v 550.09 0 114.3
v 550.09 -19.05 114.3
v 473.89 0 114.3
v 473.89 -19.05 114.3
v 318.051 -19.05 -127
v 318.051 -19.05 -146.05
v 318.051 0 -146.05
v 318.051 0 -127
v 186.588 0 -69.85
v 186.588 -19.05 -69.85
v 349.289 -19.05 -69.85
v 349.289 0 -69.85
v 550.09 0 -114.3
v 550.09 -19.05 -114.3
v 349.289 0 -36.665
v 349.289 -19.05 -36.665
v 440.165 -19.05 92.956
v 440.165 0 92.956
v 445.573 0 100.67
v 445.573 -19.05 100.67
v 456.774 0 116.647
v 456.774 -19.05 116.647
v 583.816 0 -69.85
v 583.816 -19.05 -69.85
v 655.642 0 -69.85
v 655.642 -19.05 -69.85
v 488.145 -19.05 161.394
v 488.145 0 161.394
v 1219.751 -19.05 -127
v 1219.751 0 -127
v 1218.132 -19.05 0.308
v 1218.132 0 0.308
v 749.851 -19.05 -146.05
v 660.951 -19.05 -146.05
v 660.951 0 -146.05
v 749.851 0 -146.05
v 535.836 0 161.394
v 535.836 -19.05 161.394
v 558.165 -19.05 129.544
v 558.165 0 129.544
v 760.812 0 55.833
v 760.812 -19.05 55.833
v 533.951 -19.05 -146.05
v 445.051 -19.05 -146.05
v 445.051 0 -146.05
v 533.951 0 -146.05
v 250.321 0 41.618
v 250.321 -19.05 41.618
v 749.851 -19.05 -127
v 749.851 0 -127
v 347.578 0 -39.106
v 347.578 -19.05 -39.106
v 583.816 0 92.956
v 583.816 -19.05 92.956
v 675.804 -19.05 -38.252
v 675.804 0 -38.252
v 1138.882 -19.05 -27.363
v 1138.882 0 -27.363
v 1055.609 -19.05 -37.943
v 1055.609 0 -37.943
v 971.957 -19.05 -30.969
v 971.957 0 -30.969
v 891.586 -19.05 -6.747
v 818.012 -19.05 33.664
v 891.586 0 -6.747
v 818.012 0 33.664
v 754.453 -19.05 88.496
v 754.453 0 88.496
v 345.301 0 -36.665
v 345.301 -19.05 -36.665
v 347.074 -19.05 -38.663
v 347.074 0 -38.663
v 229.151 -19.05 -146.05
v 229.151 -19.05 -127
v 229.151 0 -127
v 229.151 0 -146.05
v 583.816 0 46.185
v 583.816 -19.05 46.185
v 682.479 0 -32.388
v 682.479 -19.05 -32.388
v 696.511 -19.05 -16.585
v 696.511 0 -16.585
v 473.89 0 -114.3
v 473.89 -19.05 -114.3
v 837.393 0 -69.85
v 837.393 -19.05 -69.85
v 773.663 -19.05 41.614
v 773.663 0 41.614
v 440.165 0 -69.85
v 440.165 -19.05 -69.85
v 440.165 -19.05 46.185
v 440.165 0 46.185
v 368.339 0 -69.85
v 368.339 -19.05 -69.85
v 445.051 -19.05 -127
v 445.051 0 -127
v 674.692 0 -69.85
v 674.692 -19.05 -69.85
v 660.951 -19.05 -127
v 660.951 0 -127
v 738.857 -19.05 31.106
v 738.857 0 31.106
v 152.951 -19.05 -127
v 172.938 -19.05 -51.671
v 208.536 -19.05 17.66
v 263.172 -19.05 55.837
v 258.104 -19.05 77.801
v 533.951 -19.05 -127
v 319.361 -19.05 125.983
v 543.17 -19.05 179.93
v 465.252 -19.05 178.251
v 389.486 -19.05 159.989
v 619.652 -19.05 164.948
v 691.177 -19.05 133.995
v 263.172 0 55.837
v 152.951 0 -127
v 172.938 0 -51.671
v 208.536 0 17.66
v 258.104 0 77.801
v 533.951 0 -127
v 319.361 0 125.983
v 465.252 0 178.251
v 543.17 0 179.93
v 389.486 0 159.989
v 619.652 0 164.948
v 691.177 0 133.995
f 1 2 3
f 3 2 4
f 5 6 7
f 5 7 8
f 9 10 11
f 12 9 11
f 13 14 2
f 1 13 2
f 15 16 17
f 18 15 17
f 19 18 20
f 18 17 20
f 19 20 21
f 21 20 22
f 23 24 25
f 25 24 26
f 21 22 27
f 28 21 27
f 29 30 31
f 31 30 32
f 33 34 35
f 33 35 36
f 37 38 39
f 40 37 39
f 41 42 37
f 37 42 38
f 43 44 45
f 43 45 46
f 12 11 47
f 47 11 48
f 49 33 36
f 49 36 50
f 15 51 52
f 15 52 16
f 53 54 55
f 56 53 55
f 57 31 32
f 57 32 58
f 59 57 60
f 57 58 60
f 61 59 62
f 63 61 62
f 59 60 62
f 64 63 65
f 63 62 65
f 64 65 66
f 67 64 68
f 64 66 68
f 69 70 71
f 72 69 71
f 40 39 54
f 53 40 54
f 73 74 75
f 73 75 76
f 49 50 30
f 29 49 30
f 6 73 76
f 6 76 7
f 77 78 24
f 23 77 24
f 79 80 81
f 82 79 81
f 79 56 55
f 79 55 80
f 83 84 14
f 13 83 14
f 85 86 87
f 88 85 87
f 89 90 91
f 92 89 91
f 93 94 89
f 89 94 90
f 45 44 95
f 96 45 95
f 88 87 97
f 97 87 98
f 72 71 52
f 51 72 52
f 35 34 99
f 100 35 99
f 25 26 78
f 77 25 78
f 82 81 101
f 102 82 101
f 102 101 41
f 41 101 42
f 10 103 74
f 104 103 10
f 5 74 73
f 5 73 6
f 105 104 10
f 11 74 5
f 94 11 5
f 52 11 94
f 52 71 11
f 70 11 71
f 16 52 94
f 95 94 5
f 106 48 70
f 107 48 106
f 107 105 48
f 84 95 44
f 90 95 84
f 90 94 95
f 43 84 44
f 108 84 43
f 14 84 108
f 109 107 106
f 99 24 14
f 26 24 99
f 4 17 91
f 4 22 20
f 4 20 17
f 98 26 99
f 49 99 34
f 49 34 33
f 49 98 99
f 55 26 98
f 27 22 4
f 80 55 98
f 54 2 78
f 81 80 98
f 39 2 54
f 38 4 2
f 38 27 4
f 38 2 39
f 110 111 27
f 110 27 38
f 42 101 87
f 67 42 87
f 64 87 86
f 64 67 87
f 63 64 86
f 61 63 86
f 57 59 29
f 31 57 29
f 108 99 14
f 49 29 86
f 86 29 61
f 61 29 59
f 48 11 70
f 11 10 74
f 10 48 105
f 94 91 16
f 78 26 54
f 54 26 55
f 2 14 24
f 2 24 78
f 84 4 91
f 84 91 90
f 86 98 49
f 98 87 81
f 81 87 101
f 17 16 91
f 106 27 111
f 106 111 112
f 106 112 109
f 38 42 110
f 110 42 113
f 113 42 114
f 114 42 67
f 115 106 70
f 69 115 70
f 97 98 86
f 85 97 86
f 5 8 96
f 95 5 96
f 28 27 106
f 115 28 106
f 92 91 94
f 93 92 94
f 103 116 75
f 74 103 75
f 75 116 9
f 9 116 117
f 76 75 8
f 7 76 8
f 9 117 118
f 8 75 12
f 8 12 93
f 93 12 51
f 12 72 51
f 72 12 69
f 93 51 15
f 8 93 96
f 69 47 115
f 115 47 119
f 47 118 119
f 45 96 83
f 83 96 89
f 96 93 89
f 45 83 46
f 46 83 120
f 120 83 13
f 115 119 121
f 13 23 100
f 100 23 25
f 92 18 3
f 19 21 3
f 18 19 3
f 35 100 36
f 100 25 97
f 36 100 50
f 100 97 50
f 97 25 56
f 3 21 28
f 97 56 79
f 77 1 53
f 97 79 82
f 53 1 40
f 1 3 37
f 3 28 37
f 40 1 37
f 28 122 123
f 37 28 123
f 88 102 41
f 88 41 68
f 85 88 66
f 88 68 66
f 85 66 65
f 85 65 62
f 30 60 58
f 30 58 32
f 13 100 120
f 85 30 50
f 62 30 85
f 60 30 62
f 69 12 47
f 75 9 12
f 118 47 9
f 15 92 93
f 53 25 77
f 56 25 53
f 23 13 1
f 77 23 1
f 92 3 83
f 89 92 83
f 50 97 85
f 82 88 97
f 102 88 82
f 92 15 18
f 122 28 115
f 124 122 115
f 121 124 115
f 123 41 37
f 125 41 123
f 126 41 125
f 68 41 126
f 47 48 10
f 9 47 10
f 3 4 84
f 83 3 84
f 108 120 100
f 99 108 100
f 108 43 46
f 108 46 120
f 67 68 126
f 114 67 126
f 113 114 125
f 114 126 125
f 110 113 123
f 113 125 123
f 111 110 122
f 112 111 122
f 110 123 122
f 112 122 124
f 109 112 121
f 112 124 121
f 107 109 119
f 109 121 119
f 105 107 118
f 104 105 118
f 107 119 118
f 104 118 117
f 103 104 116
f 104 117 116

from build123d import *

# Parameters (mm, degrees)
F1_DEPTH = 19.05
F3_DEPTH = 25.4
F4_W     = 88.9
F4_H     = 19.05
F4_W_2   = 38.1
F4_H_2   = 44.45
F5_DEPTH = 19.05
F6_DEPTH = 25.4


with BuildPart() as f1:
    # F0 (on Front) → F1 (new body)
    with BuildSketch(Plane.XZ):
        with BuildLine():
            Line((754.4526390882, -127), (1219.7509574175, -127))
            Line((1219.7509574175, -127), (1218.1324014764, 0.3078377019))
            ThreePointArc((1218.1324014764, 0.3078377019), (971.9574719259, -30.9690211882), (754.4526390882, 88.4963944497))
            Line((754.4526390882, 88.4963944497), (754.4526390882, -127))
        make_face()
        with BuildLine():
            Line((152.9509574175, -127), (754.4526390882, -127))
            Line((754.4526390882, -127), (754.4526390882, 88.4963944497))
            ThreePointArc((754.4526390882, 88.4963944497), (389.4863986152, 159.9886479518), (152.9509574175, -127))
        make_face()
    extrude(amount=F1_DEPTH)

    # F2 (on face) → F3 (cut)
    with BuildSketch(Plane.XZ.offset(19.05)):
        Polygon((349.2892183732, -69.85), (250.3213995681, 41.6179700068), (186.5879998116, -69.85), (250.3213995681, -69.85), (313.393828538, -69.85), (314.0547993247, -69.85), align=None)
        Polygon((398.7721789756, 33.9153755605), (456.7740343957, 116.6469860451), (488.14527835, 161.3937189979), (263.1718880821, 55.8370334618), (275.3515595595, 42.1190060128), (321.7644516922, -10.1560762376), (345.300821131, -36.6652117763), (347.0743577182, -38.6627552758), (347.5783524621, -39.1055249546), (349.2892183732, -36.6652117763), align=None)
        Polygon((511.9904369348, 162.2207457014), (368.3392183732, -69.85), (655.6416554964, -69.85), align=None)
        Polygon((535.8355955196, 161.3937189979), (558.164750711, 129.544272866), (618.0461857734, 44.1317024412), (675.8040291483, -38.2518586693), (682.4792207708, -32.3878542947), (696.5108706698, -16.5849944314), (738.8565177121, 31.1059279369), (760.8124771809, 55.8333800289), align=None)
        Polygon((837.3928740579, -69.85), (773.6627312413, 41.6141579413), (674.6916554964, -69.85), align=None)
    extrude(amount=-F3_DEPTH, mode=Mode.SUBTRACT)

    # F4 (on face) → F5 (join)
    with BuildSketch(Plane.XZ.offset(19.05)):
        with Locations((705.4009574175, -136.525)):
            Rectangle(F4_W, F4_H)
        with Locations((489.5009574175, -136.525)):
            Rectangle(F4_W, F4_H)
        Polygon((250.3213995681, -127), (229.1509574175, -127), (229.1509574175, -146.05), (318.0509574175, -146.05), (318.0509574175, -127), align=None)
        Polygon((583.8160462156, -69.85), (655.6416554964, -69.85), (583.8160462156, 46.1853728507), align=None)
        Polygon((583.8160462156, -69.85), (583.8160462156, 46.1853728507), (550.0904369348, 100.6696116438), (550.0904369348, -69.85), align=None)
        Polygon((550.0904369348, 100.6696116438), (583.8160462156, 46.1853728507), (583.8160462156, 92.9562538667), (578.4083301084, 100.6696116438), align=None)
        Polygon((550.0904369348, -69.85), (550.0904369348, 100.6696116438), (541.6532601983, 114.3), (511.9904369348, 114.3), (511.9904369348, -69.85), align=None)
        Polygon((541.6532601983, 114.3), (550.0904369348, 100.6696116438), (550.0904369348, 114.3), align=None)
        Polygon((578.4083301084, 100.6696116438), (583.8160462156, 92.9562538667), (618.0461857734, 44.1317024412), (675.8040291483, -38.2518586693), (682.4792207708, -32.3878542947), (696.5108706698, -16.5849944314), (738.8565177121, 31.1059279369), (760.8124771809, 55.8333800289), (535.8355955196, 161.3937189979), (558.164750711, 129.544272866), align=None)
        with Locations((531.0404369348, -92.075)):
            Rectangle(F4_W_2, F4_H_2)
        Polygon((511.9904369348, 114.3), (541.6532601983, 114.3), (511.9904369348, 162.2207457014), (482.3276136712, 114.3), align=None)
        with Locations((492.9404369348, -92.075)):
            Rectangle(F4_W_2, F4_H_2)
        Polygon((473.8904369348, -69.85), (511.9904369348, -69.85), (511.9904369348, 114.3), (482.3276136712, 114.3), (473.8904369348, 100.6696116438), align=None)
        Polygon((440.164827654, -69.85), (473.8904369348, -69.85), (473.8904369348, 100.6696116438), (440.164827654, 46.1853728507), align=None)
        Polygon((473.8904369348, 100.6696116438), (482.3276136712, 114.3), (473.8904369348, 114.3), align=None)
        Polygon((368.3392183732, -69.85), (440.164827654, -69.85), (440.164827654, 46.1853728507), align=None)
        Polygon((440.164827654, 46.1853728507), (473.8904369348, 100.6696116438), (445.5725437612, 100.6696116438), (440.164827654, 92.9562538667), align=None)
    extrude(amount=-F5_DEPTH)

    # F4 (on face) → F6 (cut)
    with BuildSketch(Plane.XZ.offset(19.05)):
        Polygon((583.8160462156, -69.85), (655.6416554964, -69.85), (583.8160462156, 46.1853728507), align=None)
        Polygon((550.0904369348, -69.85), (550.0904369348, 100.6696116438), (541.6532601983, 114.3), (511.9904369348, 114.3), (511.9904369348, -69.85), align=None)
        Polygon((541.6532601983, 114.3), (550.0904369348, 100.6696116438), (550.0904369348, 114.3), align=None)
        Polygon((578.4083301084, 100.6696116438), (583.8160462156, 92.9562538667), (618.0461857734, 44.1317024412), (675.8040291483, -38.2518586693), (682.4792207708, -32.3878542947), (696.5108706698, -16.5849944314), (738.8565177121, 31.1059279369), (760.8124771809, 55.8333800289), (535.8355955196, 161.3937189979), (558.164750711, 129.544272866), align=None)
        with Locations((531.0404369348, -92.075)):
            Rectangle(F4_W_2, F4_H_2)
        with Locations((492.9404369348, -92.075)):
            Rectangle(F4_W_2, F4_H_2)
        Polygon((473.8904369348, -69.85), (511.9904369348, -69.85), (511.9904369348, 114.3), (482.3276136712, 114.3), (473.8904369348, 100.6696116438), align=None)
        Polygon((473.8904369348, 100.6696116438), (482.3276136712, 114.3), (473.8904369348, 114.3), align=None)
        Polygon((368.3392183732, -69.85), (440.164827654, -69.85), (440.164827654, 46.1853728507), align=None)
    extrude(amount=-F6_DEPTH, mode=Mode.SUBTRACT)


solid = f1.part
